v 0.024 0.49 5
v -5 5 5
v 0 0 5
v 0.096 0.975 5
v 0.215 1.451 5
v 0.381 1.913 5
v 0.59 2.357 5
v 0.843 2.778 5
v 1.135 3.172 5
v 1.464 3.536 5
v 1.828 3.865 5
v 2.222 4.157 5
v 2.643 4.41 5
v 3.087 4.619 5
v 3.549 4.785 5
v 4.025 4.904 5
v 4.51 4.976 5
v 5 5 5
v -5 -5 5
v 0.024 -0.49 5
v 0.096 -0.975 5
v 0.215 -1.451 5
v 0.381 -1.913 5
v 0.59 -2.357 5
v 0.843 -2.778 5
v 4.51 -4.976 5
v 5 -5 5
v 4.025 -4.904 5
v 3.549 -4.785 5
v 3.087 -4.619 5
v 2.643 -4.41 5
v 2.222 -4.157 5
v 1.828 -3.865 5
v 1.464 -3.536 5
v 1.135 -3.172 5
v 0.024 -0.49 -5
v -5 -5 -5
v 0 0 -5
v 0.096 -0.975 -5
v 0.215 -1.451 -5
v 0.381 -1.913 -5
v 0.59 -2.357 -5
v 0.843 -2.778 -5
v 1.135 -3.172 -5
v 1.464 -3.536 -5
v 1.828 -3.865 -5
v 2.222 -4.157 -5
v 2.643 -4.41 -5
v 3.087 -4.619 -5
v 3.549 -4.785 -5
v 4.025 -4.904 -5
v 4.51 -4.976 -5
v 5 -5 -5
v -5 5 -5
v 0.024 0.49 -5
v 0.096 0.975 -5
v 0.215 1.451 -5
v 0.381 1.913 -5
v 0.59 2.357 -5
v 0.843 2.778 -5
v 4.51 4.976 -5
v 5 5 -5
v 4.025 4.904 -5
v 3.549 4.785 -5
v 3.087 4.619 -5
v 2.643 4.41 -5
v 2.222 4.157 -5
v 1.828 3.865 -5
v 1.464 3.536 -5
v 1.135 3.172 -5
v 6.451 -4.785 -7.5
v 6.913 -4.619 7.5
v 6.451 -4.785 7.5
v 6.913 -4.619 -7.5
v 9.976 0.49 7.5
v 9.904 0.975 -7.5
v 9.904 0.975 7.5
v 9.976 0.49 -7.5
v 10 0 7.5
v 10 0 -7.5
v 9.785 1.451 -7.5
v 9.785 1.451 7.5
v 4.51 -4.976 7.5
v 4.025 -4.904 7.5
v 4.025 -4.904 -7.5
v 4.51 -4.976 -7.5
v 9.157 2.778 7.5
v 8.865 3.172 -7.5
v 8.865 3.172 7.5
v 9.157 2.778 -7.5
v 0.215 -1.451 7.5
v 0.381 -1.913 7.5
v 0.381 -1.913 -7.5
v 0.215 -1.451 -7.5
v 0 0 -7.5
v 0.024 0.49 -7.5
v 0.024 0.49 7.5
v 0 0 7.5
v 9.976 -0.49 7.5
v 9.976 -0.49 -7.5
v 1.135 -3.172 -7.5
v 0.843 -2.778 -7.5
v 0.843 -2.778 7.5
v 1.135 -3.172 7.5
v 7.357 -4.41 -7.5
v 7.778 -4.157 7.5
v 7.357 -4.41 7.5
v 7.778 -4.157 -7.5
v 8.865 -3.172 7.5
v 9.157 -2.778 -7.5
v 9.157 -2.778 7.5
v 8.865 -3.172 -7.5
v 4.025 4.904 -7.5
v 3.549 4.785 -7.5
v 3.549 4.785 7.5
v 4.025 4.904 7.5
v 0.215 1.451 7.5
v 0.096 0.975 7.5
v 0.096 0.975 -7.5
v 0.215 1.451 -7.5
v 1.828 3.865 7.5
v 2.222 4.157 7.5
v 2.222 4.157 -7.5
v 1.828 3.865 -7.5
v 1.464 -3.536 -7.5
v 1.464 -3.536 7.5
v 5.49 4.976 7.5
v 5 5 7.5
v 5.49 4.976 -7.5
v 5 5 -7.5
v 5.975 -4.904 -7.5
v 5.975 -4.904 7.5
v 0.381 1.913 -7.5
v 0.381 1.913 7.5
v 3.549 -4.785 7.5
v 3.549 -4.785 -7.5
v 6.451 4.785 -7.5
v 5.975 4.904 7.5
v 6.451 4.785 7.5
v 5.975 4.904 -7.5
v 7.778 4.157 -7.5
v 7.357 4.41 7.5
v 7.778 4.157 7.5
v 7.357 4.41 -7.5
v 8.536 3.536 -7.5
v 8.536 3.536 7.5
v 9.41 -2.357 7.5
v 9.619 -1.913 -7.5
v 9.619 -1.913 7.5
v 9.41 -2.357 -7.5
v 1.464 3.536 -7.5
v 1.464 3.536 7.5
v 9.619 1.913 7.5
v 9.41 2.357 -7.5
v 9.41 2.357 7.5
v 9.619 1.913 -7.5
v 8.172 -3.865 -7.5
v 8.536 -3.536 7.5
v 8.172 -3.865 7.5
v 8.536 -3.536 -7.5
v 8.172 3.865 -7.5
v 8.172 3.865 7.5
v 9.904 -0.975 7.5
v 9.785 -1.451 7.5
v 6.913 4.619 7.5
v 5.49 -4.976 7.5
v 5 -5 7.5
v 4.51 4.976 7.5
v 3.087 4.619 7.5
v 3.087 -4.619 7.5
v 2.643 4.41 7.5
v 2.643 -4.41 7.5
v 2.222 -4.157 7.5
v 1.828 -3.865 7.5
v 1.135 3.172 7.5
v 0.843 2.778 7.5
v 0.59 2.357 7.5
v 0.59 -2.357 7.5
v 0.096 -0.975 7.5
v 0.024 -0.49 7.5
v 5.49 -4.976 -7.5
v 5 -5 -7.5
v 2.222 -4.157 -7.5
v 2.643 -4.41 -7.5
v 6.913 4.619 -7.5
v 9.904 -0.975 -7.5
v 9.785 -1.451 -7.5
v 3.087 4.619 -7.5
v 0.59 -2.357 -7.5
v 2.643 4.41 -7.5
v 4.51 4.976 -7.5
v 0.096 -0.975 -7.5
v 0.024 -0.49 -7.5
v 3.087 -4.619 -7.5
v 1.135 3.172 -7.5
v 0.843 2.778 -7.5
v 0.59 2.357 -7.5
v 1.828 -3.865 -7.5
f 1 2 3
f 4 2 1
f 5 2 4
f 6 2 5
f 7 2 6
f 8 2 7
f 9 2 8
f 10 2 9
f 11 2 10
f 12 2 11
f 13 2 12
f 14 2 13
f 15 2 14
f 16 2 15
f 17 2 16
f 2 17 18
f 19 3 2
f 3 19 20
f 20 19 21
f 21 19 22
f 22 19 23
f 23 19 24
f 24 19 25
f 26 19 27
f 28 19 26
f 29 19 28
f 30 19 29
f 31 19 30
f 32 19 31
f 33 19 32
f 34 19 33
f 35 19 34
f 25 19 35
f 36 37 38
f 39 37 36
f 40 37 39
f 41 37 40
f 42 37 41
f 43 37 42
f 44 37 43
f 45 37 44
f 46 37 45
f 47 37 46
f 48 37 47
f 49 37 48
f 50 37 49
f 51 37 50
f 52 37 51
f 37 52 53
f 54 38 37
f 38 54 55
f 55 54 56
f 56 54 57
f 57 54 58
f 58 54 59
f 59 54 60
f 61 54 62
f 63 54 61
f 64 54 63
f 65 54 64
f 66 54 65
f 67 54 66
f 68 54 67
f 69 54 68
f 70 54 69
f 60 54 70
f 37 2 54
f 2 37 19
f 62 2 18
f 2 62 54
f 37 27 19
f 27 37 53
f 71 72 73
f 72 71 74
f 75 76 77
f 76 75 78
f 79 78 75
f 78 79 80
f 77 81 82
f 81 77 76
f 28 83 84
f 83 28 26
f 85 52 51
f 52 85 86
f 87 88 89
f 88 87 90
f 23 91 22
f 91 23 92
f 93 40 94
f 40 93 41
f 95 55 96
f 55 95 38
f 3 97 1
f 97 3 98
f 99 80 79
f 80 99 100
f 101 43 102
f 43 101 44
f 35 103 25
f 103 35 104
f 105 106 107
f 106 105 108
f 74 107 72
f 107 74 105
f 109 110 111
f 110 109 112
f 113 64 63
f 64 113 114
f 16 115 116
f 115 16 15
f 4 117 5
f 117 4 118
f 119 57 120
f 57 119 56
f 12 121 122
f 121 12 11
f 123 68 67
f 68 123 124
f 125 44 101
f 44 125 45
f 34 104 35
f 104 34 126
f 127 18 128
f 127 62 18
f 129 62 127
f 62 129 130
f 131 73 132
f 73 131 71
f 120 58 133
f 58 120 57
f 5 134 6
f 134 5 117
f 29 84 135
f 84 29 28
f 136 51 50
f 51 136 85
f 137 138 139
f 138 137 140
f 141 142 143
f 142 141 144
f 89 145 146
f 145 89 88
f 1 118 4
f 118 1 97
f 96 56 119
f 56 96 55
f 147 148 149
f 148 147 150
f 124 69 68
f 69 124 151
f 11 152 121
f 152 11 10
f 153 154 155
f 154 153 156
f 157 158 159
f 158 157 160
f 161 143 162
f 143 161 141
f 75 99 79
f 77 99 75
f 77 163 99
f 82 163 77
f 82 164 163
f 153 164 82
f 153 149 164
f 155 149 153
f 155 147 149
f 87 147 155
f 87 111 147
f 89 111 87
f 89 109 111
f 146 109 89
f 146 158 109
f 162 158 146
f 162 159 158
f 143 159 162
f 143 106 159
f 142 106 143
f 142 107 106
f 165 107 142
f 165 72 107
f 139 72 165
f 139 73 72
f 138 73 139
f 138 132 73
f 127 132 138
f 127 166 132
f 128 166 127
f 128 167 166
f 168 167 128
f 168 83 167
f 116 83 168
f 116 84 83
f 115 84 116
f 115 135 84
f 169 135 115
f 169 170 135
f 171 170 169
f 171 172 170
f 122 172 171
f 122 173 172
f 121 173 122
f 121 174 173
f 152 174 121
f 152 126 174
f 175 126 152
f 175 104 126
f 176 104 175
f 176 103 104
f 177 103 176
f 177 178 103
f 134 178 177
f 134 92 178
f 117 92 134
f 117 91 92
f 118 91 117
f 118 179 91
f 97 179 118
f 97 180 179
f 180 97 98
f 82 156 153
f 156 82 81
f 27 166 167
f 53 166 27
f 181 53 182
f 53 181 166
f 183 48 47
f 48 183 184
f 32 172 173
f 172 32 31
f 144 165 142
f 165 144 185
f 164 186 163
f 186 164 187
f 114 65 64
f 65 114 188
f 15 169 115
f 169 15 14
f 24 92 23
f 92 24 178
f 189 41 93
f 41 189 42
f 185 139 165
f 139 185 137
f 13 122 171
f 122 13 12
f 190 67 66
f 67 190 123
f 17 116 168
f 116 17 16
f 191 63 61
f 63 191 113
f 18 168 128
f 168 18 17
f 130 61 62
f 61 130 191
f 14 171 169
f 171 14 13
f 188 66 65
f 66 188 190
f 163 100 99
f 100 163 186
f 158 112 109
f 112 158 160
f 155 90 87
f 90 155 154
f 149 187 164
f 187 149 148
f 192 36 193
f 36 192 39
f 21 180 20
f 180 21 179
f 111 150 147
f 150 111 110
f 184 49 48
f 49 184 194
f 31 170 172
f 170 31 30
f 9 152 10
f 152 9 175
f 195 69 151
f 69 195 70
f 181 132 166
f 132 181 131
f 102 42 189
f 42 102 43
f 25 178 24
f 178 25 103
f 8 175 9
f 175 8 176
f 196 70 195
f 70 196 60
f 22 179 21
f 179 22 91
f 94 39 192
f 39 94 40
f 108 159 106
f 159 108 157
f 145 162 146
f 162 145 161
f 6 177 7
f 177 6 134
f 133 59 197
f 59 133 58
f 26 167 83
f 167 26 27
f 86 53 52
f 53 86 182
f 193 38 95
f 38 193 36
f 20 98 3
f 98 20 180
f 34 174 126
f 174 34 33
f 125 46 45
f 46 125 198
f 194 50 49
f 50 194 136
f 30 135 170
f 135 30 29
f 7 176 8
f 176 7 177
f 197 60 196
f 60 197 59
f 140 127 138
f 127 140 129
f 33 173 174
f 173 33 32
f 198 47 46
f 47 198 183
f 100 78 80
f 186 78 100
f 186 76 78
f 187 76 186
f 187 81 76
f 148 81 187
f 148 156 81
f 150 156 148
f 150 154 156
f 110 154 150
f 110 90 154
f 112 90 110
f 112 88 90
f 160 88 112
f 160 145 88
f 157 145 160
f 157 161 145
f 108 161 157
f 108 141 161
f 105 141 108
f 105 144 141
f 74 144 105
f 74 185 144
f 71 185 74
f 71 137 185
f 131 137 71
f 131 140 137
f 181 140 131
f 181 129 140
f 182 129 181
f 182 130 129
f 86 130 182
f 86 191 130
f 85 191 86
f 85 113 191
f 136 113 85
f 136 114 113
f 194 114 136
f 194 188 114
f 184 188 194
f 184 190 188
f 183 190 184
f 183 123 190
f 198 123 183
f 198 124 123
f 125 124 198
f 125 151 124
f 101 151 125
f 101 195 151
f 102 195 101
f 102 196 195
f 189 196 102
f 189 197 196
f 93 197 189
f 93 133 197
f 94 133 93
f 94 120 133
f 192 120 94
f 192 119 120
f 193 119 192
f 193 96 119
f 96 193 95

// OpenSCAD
// Set fragment number for roundings
$fn = $preview ? 32 : 64;

// Size of the Cube (all directions)
cuSize = 10;

// The diameter of the Cylinder
cyDia = 10;

// The height of the Cylinder
cyHei = 15;

// X-Translation of the Cylinder
tX = 5;

// Create Cube and move Cylinder by 'tX'
cube(size = [cuSize, cuSize, cuSize], center = true);
translate([tX, 0, 0])
    cylinder(d = cyDia, h = cyHei, center = true);
